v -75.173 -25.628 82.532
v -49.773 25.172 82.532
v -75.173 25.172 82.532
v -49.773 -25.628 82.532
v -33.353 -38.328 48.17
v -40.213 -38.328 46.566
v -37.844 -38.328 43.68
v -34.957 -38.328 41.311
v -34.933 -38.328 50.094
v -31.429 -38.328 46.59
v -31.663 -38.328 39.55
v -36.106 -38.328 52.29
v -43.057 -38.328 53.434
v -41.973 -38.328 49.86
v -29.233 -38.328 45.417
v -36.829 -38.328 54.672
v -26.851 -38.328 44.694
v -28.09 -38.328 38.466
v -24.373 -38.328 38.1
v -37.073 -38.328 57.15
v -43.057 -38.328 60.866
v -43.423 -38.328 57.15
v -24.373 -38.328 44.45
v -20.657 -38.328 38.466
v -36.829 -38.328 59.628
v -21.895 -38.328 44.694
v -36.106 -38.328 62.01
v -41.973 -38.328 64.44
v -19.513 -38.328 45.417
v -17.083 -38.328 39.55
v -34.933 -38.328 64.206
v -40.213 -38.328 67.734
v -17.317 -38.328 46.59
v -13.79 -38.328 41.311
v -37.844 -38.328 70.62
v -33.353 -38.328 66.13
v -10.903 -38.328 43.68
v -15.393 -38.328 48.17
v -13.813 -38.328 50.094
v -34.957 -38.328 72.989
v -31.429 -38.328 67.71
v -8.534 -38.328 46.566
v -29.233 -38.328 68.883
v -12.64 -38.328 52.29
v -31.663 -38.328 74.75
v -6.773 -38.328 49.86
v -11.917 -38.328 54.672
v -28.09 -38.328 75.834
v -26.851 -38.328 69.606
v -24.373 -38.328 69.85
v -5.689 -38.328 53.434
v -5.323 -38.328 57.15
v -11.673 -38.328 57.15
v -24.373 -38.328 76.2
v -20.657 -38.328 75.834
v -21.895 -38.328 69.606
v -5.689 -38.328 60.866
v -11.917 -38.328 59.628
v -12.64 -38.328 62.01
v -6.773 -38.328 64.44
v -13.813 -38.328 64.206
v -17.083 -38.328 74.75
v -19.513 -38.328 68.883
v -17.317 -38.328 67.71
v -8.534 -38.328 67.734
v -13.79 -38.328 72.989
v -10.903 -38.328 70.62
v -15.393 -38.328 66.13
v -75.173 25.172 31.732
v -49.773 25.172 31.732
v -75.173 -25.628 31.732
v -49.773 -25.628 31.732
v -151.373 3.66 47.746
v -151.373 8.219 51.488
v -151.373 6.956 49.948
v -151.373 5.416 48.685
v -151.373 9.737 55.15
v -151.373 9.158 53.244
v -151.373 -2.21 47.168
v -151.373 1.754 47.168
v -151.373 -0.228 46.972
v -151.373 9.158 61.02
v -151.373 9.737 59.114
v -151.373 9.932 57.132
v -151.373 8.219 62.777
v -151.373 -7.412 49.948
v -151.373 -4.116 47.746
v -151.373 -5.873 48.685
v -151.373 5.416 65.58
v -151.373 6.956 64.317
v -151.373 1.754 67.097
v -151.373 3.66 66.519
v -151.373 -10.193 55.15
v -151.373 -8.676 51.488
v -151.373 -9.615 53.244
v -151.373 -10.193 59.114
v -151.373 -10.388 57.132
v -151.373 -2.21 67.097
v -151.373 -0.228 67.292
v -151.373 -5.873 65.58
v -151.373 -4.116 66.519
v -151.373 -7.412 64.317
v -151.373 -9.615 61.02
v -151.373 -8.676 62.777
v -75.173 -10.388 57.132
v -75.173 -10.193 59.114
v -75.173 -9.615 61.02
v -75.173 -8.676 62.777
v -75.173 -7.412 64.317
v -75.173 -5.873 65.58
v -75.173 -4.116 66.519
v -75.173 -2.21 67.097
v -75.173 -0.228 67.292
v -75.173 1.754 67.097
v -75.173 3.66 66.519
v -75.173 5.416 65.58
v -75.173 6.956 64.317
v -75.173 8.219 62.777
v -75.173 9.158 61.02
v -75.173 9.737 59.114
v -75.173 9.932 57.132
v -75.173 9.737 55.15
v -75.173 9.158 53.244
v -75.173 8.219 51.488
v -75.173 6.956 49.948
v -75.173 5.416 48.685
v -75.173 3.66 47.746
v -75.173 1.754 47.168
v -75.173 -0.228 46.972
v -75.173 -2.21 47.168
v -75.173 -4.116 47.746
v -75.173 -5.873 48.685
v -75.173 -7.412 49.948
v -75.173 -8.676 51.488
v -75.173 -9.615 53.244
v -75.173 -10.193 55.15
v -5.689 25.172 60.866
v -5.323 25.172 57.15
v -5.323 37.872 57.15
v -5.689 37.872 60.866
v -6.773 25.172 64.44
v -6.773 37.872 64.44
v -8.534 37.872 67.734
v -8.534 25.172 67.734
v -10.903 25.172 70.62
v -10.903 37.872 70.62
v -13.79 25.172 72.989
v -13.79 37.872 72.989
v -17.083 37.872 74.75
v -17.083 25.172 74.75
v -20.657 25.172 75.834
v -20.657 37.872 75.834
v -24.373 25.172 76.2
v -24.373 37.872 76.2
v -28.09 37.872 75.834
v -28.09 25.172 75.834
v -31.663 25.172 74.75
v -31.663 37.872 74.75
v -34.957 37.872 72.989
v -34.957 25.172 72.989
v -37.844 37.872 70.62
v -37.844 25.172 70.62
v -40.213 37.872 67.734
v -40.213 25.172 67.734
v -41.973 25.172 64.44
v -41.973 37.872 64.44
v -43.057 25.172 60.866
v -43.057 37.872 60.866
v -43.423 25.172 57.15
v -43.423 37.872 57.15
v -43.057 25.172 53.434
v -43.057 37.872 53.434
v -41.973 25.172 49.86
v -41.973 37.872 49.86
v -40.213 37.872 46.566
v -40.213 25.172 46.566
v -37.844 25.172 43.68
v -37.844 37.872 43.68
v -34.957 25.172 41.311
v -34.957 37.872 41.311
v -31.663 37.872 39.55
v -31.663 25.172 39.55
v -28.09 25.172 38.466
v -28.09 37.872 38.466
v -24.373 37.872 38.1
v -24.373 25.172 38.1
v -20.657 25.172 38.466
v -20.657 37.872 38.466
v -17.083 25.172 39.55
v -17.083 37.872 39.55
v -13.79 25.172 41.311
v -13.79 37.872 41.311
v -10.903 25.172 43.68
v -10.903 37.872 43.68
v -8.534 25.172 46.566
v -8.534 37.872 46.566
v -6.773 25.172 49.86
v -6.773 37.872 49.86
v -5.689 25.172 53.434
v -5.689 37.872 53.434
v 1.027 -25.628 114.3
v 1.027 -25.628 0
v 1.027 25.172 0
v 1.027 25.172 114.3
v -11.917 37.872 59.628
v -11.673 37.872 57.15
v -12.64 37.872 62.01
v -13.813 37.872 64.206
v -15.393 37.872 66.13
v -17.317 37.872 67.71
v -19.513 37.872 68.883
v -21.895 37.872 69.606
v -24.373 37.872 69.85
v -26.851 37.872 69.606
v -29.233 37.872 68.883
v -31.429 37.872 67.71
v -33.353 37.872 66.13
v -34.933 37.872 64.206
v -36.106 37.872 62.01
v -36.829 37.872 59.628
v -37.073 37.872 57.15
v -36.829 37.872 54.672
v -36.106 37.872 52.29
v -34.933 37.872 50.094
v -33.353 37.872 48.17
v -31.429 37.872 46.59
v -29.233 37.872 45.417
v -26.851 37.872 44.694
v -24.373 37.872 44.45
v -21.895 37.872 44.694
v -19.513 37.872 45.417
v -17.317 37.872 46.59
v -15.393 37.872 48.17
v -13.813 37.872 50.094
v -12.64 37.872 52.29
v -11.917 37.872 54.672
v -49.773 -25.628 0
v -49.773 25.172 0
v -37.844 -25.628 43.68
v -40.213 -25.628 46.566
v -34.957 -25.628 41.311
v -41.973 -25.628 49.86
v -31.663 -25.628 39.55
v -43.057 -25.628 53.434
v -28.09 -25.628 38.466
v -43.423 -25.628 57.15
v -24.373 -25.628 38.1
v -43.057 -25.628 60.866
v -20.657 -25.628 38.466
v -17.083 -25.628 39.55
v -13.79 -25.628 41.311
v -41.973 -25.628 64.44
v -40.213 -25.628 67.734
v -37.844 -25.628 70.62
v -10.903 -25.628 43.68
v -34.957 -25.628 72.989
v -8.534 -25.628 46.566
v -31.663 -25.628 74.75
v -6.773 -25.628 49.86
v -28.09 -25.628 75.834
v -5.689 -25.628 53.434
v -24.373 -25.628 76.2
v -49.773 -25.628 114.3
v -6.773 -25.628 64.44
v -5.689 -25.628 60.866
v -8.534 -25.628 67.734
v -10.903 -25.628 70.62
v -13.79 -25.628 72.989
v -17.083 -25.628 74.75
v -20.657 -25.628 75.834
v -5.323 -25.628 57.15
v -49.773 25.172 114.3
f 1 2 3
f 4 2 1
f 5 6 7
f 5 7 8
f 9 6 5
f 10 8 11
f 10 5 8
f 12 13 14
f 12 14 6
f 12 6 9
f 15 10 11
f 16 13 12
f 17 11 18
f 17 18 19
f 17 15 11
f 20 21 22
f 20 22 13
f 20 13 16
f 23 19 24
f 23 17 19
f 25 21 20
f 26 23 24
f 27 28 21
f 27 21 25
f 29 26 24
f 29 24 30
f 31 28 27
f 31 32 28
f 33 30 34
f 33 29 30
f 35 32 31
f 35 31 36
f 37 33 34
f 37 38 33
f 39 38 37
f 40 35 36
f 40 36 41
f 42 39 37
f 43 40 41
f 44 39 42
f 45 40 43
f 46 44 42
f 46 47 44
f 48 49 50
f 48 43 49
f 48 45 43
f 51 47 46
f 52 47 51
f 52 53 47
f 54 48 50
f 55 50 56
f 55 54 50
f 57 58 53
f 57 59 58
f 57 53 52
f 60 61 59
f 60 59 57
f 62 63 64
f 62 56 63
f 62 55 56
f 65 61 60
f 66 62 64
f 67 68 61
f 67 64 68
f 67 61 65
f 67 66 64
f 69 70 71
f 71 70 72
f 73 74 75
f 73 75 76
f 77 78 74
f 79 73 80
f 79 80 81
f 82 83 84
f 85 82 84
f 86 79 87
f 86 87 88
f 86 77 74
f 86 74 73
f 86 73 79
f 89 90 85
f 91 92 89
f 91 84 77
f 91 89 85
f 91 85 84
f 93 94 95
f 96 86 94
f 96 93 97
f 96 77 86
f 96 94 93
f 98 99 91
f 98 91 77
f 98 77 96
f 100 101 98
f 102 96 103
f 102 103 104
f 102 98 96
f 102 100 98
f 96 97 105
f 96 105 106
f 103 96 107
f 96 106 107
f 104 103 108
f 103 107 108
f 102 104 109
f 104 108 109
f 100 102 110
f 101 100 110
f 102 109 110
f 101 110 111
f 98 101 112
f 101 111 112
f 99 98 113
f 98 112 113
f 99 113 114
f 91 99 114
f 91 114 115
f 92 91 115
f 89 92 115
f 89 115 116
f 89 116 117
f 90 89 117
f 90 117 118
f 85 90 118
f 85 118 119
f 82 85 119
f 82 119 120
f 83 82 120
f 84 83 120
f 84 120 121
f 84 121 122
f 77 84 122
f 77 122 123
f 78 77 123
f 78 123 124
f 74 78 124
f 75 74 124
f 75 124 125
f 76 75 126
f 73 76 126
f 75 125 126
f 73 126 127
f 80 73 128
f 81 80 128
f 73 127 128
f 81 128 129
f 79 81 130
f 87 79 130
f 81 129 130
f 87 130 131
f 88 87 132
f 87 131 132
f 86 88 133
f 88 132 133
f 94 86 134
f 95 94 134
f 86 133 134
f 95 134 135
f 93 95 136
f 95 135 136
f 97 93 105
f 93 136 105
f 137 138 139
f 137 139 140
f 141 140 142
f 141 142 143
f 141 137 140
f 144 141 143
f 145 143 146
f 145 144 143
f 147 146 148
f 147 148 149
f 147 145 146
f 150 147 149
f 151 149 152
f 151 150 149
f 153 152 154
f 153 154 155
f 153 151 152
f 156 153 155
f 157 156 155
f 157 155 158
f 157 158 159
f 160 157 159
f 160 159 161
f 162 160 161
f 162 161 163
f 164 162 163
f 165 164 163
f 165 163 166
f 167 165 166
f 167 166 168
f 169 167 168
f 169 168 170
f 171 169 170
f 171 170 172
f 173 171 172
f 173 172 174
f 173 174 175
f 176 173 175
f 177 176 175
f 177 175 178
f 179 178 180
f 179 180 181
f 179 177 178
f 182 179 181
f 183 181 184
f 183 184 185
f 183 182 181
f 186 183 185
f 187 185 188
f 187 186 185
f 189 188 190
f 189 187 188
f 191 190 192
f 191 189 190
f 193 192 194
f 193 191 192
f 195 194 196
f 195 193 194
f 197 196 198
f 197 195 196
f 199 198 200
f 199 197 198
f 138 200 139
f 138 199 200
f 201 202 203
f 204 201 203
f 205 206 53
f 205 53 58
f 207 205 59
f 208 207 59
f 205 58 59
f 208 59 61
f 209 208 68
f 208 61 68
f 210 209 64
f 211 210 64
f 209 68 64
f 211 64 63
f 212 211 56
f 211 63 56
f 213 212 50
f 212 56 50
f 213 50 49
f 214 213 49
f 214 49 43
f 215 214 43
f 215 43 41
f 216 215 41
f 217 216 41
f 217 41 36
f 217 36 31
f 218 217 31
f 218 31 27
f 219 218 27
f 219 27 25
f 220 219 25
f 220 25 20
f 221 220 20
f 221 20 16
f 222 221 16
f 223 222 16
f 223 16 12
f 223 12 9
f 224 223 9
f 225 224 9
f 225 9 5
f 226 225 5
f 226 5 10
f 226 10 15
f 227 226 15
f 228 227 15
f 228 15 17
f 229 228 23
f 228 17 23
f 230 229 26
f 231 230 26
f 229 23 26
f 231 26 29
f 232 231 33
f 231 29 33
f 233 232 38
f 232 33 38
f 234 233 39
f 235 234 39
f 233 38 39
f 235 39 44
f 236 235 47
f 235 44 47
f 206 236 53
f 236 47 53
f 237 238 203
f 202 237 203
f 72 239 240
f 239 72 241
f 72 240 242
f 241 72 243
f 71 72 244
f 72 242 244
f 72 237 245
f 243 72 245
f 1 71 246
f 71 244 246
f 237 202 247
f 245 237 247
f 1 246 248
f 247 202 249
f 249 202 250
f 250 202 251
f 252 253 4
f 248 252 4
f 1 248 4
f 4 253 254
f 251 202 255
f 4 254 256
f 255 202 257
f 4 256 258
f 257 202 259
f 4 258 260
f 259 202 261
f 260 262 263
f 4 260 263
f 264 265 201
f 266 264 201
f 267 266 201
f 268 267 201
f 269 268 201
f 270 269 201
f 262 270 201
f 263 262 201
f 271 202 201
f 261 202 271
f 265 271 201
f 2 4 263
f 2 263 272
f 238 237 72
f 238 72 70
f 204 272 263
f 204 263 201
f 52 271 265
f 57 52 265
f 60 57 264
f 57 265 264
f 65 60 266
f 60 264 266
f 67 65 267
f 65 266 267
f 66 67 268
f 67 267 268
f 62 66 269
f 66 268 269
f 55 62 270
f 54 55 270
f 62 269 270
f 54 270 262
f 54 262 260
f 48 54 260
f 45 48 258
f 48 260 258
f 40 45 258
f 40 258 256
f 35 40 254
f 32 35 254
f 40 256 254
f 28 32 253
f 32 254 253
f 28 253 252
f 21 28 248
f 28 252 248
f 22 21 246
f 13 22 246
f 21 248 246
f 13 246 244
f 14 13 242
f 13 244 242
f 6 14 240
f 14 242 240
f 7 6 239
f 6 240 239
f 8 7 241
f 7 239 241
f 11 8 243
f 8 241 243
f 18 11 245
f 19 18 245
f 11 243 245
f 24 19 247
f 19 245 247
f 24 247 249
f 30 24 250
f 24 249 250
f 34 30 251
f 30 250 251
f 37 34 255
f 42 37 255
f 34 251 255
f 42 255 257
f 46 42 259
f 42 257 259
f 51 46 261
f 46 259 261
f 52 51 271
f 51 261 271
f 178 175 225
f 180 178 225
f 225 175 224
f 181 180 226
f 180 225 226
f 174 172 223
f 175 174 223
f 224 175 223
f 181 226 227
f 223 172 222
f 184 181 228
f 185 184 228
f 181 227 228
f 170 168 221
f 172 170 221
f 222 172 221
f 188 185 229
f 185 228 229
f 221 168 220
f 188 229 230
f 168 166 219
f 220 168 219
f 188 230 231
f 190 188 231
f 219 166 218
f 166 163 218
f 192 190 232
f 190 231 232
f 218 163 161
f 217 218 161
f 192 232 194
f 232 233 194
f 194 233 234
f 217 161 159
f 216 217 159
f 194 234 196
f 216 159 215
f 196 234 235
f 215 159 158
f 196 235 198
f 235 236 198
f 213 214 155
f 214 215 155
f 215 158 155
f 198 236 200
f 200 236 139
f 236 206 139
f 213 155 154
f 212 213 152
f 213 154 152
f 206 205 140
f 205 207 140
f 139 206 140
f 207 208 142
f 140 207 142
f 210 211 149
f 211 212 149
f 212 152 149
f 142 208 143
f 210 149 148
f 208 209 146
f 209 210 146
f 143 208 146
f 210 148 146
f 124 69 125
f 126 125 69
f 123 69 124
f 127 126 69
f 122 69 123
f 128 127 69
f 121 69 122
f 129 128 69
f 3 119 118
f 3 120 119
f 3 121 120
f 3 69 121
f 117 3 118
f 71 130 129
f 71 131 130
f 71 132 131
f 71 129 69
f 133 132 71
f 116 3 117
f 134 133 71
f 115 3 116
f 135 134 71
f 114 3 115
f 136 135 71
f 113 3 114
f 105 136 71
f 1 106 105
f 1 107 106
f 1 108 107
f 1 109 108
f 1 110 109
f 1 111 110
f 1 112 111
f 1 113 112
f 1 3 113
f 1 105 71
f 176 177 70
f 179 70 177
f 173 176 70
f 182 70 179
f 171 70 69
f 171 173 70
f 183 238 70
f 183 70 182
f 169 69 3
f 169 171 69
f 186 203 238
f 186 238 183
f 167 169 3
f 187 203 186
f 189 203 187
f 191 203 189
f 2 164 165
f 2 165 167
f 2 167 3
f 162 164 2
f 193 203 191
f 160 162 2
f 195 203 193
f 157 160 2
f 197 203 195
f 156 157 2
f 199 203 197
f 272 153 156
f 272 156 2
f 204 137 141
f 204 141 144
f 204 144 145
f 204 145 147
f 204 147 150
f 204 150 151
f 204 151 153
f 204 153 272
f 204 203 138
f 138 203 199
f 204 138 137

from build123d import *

# Parameters (mm, degrees)
F0_W          = 50.8
F0_H          = 50.8
F1_DEPTH      = 114.3
F2_R          = 12.7
F3_DEPTH      = 76.2
F2_R_2        = 19.05
F4_DEPTH      = 12.7
F4_DEPTH_BACK = 63.5
F5_R          = 10.16
F6_DEPTH      = 101.6
F5_W          = 50.8
F5_H          = 50.8
F7_DEPTH      = 25.4


with BuildPart() as f1:
    # F0 (on Top) → F1 (new body)
    with BuildSketch(Plane.XY):
        with Locations((-24.373119, -0.228241)):
            Rectangle(F0_W, F0_H)
    extrude(amount=F1_DEPTH)

    # F2 (on face) → F3 (cut)
    with BuildSketch(Plane.XZ.offset(25.628241)):
        with Locations((-24.373119, 57.15)):
            Circle(F2_R)
    extrude(amount=-F3_DEPTH, mode=Mode.SUBTRACT)

    # F2 (on face) → F4 (join, two sides)
    with BuildSketch(Plane.XZ.offset(25.628241)) as f4_sk:
        with Locations((-24.373119, 57.15)):
            Circle(F2_R_2)
        with Locations((-24.373119, 57.15)):
            Circle(F2_R, mode=Mode.SUBTRACT)
    extrude(amount=F4_DEPTH)
    extrude(f4_sk.sketch, amount=-F4_DEPTH_BACK)

    # F5 (on face) → F6 (join)
    with BuildSketch(Plane(origin=(-49.773119, 0, 0), x_dir=(0, -1, 0), z_dir=(-1, 0, 0))):
        with Locations((0.228241, 57.132342)):
            Circle(F5_R)
    extrude(amount=F6_DEPTH)

    # F5 (on face) → F7 (join)
    with BuildSketch(Plane(origin=(-49.773119, 0, 0), x_dir=(0, -1, 0), z_dir=(-1, 0, 0))):
        with Locations((0.228241, 57.132342)):
            Rectangle(F5_W, F5_H)
        with Locations((0.228241, 57.132342)):
            Circle(F5_R, mode=Mode.SUBTRACT)
    extrude(amount=F7_DEPTH)


solid = f1.part
